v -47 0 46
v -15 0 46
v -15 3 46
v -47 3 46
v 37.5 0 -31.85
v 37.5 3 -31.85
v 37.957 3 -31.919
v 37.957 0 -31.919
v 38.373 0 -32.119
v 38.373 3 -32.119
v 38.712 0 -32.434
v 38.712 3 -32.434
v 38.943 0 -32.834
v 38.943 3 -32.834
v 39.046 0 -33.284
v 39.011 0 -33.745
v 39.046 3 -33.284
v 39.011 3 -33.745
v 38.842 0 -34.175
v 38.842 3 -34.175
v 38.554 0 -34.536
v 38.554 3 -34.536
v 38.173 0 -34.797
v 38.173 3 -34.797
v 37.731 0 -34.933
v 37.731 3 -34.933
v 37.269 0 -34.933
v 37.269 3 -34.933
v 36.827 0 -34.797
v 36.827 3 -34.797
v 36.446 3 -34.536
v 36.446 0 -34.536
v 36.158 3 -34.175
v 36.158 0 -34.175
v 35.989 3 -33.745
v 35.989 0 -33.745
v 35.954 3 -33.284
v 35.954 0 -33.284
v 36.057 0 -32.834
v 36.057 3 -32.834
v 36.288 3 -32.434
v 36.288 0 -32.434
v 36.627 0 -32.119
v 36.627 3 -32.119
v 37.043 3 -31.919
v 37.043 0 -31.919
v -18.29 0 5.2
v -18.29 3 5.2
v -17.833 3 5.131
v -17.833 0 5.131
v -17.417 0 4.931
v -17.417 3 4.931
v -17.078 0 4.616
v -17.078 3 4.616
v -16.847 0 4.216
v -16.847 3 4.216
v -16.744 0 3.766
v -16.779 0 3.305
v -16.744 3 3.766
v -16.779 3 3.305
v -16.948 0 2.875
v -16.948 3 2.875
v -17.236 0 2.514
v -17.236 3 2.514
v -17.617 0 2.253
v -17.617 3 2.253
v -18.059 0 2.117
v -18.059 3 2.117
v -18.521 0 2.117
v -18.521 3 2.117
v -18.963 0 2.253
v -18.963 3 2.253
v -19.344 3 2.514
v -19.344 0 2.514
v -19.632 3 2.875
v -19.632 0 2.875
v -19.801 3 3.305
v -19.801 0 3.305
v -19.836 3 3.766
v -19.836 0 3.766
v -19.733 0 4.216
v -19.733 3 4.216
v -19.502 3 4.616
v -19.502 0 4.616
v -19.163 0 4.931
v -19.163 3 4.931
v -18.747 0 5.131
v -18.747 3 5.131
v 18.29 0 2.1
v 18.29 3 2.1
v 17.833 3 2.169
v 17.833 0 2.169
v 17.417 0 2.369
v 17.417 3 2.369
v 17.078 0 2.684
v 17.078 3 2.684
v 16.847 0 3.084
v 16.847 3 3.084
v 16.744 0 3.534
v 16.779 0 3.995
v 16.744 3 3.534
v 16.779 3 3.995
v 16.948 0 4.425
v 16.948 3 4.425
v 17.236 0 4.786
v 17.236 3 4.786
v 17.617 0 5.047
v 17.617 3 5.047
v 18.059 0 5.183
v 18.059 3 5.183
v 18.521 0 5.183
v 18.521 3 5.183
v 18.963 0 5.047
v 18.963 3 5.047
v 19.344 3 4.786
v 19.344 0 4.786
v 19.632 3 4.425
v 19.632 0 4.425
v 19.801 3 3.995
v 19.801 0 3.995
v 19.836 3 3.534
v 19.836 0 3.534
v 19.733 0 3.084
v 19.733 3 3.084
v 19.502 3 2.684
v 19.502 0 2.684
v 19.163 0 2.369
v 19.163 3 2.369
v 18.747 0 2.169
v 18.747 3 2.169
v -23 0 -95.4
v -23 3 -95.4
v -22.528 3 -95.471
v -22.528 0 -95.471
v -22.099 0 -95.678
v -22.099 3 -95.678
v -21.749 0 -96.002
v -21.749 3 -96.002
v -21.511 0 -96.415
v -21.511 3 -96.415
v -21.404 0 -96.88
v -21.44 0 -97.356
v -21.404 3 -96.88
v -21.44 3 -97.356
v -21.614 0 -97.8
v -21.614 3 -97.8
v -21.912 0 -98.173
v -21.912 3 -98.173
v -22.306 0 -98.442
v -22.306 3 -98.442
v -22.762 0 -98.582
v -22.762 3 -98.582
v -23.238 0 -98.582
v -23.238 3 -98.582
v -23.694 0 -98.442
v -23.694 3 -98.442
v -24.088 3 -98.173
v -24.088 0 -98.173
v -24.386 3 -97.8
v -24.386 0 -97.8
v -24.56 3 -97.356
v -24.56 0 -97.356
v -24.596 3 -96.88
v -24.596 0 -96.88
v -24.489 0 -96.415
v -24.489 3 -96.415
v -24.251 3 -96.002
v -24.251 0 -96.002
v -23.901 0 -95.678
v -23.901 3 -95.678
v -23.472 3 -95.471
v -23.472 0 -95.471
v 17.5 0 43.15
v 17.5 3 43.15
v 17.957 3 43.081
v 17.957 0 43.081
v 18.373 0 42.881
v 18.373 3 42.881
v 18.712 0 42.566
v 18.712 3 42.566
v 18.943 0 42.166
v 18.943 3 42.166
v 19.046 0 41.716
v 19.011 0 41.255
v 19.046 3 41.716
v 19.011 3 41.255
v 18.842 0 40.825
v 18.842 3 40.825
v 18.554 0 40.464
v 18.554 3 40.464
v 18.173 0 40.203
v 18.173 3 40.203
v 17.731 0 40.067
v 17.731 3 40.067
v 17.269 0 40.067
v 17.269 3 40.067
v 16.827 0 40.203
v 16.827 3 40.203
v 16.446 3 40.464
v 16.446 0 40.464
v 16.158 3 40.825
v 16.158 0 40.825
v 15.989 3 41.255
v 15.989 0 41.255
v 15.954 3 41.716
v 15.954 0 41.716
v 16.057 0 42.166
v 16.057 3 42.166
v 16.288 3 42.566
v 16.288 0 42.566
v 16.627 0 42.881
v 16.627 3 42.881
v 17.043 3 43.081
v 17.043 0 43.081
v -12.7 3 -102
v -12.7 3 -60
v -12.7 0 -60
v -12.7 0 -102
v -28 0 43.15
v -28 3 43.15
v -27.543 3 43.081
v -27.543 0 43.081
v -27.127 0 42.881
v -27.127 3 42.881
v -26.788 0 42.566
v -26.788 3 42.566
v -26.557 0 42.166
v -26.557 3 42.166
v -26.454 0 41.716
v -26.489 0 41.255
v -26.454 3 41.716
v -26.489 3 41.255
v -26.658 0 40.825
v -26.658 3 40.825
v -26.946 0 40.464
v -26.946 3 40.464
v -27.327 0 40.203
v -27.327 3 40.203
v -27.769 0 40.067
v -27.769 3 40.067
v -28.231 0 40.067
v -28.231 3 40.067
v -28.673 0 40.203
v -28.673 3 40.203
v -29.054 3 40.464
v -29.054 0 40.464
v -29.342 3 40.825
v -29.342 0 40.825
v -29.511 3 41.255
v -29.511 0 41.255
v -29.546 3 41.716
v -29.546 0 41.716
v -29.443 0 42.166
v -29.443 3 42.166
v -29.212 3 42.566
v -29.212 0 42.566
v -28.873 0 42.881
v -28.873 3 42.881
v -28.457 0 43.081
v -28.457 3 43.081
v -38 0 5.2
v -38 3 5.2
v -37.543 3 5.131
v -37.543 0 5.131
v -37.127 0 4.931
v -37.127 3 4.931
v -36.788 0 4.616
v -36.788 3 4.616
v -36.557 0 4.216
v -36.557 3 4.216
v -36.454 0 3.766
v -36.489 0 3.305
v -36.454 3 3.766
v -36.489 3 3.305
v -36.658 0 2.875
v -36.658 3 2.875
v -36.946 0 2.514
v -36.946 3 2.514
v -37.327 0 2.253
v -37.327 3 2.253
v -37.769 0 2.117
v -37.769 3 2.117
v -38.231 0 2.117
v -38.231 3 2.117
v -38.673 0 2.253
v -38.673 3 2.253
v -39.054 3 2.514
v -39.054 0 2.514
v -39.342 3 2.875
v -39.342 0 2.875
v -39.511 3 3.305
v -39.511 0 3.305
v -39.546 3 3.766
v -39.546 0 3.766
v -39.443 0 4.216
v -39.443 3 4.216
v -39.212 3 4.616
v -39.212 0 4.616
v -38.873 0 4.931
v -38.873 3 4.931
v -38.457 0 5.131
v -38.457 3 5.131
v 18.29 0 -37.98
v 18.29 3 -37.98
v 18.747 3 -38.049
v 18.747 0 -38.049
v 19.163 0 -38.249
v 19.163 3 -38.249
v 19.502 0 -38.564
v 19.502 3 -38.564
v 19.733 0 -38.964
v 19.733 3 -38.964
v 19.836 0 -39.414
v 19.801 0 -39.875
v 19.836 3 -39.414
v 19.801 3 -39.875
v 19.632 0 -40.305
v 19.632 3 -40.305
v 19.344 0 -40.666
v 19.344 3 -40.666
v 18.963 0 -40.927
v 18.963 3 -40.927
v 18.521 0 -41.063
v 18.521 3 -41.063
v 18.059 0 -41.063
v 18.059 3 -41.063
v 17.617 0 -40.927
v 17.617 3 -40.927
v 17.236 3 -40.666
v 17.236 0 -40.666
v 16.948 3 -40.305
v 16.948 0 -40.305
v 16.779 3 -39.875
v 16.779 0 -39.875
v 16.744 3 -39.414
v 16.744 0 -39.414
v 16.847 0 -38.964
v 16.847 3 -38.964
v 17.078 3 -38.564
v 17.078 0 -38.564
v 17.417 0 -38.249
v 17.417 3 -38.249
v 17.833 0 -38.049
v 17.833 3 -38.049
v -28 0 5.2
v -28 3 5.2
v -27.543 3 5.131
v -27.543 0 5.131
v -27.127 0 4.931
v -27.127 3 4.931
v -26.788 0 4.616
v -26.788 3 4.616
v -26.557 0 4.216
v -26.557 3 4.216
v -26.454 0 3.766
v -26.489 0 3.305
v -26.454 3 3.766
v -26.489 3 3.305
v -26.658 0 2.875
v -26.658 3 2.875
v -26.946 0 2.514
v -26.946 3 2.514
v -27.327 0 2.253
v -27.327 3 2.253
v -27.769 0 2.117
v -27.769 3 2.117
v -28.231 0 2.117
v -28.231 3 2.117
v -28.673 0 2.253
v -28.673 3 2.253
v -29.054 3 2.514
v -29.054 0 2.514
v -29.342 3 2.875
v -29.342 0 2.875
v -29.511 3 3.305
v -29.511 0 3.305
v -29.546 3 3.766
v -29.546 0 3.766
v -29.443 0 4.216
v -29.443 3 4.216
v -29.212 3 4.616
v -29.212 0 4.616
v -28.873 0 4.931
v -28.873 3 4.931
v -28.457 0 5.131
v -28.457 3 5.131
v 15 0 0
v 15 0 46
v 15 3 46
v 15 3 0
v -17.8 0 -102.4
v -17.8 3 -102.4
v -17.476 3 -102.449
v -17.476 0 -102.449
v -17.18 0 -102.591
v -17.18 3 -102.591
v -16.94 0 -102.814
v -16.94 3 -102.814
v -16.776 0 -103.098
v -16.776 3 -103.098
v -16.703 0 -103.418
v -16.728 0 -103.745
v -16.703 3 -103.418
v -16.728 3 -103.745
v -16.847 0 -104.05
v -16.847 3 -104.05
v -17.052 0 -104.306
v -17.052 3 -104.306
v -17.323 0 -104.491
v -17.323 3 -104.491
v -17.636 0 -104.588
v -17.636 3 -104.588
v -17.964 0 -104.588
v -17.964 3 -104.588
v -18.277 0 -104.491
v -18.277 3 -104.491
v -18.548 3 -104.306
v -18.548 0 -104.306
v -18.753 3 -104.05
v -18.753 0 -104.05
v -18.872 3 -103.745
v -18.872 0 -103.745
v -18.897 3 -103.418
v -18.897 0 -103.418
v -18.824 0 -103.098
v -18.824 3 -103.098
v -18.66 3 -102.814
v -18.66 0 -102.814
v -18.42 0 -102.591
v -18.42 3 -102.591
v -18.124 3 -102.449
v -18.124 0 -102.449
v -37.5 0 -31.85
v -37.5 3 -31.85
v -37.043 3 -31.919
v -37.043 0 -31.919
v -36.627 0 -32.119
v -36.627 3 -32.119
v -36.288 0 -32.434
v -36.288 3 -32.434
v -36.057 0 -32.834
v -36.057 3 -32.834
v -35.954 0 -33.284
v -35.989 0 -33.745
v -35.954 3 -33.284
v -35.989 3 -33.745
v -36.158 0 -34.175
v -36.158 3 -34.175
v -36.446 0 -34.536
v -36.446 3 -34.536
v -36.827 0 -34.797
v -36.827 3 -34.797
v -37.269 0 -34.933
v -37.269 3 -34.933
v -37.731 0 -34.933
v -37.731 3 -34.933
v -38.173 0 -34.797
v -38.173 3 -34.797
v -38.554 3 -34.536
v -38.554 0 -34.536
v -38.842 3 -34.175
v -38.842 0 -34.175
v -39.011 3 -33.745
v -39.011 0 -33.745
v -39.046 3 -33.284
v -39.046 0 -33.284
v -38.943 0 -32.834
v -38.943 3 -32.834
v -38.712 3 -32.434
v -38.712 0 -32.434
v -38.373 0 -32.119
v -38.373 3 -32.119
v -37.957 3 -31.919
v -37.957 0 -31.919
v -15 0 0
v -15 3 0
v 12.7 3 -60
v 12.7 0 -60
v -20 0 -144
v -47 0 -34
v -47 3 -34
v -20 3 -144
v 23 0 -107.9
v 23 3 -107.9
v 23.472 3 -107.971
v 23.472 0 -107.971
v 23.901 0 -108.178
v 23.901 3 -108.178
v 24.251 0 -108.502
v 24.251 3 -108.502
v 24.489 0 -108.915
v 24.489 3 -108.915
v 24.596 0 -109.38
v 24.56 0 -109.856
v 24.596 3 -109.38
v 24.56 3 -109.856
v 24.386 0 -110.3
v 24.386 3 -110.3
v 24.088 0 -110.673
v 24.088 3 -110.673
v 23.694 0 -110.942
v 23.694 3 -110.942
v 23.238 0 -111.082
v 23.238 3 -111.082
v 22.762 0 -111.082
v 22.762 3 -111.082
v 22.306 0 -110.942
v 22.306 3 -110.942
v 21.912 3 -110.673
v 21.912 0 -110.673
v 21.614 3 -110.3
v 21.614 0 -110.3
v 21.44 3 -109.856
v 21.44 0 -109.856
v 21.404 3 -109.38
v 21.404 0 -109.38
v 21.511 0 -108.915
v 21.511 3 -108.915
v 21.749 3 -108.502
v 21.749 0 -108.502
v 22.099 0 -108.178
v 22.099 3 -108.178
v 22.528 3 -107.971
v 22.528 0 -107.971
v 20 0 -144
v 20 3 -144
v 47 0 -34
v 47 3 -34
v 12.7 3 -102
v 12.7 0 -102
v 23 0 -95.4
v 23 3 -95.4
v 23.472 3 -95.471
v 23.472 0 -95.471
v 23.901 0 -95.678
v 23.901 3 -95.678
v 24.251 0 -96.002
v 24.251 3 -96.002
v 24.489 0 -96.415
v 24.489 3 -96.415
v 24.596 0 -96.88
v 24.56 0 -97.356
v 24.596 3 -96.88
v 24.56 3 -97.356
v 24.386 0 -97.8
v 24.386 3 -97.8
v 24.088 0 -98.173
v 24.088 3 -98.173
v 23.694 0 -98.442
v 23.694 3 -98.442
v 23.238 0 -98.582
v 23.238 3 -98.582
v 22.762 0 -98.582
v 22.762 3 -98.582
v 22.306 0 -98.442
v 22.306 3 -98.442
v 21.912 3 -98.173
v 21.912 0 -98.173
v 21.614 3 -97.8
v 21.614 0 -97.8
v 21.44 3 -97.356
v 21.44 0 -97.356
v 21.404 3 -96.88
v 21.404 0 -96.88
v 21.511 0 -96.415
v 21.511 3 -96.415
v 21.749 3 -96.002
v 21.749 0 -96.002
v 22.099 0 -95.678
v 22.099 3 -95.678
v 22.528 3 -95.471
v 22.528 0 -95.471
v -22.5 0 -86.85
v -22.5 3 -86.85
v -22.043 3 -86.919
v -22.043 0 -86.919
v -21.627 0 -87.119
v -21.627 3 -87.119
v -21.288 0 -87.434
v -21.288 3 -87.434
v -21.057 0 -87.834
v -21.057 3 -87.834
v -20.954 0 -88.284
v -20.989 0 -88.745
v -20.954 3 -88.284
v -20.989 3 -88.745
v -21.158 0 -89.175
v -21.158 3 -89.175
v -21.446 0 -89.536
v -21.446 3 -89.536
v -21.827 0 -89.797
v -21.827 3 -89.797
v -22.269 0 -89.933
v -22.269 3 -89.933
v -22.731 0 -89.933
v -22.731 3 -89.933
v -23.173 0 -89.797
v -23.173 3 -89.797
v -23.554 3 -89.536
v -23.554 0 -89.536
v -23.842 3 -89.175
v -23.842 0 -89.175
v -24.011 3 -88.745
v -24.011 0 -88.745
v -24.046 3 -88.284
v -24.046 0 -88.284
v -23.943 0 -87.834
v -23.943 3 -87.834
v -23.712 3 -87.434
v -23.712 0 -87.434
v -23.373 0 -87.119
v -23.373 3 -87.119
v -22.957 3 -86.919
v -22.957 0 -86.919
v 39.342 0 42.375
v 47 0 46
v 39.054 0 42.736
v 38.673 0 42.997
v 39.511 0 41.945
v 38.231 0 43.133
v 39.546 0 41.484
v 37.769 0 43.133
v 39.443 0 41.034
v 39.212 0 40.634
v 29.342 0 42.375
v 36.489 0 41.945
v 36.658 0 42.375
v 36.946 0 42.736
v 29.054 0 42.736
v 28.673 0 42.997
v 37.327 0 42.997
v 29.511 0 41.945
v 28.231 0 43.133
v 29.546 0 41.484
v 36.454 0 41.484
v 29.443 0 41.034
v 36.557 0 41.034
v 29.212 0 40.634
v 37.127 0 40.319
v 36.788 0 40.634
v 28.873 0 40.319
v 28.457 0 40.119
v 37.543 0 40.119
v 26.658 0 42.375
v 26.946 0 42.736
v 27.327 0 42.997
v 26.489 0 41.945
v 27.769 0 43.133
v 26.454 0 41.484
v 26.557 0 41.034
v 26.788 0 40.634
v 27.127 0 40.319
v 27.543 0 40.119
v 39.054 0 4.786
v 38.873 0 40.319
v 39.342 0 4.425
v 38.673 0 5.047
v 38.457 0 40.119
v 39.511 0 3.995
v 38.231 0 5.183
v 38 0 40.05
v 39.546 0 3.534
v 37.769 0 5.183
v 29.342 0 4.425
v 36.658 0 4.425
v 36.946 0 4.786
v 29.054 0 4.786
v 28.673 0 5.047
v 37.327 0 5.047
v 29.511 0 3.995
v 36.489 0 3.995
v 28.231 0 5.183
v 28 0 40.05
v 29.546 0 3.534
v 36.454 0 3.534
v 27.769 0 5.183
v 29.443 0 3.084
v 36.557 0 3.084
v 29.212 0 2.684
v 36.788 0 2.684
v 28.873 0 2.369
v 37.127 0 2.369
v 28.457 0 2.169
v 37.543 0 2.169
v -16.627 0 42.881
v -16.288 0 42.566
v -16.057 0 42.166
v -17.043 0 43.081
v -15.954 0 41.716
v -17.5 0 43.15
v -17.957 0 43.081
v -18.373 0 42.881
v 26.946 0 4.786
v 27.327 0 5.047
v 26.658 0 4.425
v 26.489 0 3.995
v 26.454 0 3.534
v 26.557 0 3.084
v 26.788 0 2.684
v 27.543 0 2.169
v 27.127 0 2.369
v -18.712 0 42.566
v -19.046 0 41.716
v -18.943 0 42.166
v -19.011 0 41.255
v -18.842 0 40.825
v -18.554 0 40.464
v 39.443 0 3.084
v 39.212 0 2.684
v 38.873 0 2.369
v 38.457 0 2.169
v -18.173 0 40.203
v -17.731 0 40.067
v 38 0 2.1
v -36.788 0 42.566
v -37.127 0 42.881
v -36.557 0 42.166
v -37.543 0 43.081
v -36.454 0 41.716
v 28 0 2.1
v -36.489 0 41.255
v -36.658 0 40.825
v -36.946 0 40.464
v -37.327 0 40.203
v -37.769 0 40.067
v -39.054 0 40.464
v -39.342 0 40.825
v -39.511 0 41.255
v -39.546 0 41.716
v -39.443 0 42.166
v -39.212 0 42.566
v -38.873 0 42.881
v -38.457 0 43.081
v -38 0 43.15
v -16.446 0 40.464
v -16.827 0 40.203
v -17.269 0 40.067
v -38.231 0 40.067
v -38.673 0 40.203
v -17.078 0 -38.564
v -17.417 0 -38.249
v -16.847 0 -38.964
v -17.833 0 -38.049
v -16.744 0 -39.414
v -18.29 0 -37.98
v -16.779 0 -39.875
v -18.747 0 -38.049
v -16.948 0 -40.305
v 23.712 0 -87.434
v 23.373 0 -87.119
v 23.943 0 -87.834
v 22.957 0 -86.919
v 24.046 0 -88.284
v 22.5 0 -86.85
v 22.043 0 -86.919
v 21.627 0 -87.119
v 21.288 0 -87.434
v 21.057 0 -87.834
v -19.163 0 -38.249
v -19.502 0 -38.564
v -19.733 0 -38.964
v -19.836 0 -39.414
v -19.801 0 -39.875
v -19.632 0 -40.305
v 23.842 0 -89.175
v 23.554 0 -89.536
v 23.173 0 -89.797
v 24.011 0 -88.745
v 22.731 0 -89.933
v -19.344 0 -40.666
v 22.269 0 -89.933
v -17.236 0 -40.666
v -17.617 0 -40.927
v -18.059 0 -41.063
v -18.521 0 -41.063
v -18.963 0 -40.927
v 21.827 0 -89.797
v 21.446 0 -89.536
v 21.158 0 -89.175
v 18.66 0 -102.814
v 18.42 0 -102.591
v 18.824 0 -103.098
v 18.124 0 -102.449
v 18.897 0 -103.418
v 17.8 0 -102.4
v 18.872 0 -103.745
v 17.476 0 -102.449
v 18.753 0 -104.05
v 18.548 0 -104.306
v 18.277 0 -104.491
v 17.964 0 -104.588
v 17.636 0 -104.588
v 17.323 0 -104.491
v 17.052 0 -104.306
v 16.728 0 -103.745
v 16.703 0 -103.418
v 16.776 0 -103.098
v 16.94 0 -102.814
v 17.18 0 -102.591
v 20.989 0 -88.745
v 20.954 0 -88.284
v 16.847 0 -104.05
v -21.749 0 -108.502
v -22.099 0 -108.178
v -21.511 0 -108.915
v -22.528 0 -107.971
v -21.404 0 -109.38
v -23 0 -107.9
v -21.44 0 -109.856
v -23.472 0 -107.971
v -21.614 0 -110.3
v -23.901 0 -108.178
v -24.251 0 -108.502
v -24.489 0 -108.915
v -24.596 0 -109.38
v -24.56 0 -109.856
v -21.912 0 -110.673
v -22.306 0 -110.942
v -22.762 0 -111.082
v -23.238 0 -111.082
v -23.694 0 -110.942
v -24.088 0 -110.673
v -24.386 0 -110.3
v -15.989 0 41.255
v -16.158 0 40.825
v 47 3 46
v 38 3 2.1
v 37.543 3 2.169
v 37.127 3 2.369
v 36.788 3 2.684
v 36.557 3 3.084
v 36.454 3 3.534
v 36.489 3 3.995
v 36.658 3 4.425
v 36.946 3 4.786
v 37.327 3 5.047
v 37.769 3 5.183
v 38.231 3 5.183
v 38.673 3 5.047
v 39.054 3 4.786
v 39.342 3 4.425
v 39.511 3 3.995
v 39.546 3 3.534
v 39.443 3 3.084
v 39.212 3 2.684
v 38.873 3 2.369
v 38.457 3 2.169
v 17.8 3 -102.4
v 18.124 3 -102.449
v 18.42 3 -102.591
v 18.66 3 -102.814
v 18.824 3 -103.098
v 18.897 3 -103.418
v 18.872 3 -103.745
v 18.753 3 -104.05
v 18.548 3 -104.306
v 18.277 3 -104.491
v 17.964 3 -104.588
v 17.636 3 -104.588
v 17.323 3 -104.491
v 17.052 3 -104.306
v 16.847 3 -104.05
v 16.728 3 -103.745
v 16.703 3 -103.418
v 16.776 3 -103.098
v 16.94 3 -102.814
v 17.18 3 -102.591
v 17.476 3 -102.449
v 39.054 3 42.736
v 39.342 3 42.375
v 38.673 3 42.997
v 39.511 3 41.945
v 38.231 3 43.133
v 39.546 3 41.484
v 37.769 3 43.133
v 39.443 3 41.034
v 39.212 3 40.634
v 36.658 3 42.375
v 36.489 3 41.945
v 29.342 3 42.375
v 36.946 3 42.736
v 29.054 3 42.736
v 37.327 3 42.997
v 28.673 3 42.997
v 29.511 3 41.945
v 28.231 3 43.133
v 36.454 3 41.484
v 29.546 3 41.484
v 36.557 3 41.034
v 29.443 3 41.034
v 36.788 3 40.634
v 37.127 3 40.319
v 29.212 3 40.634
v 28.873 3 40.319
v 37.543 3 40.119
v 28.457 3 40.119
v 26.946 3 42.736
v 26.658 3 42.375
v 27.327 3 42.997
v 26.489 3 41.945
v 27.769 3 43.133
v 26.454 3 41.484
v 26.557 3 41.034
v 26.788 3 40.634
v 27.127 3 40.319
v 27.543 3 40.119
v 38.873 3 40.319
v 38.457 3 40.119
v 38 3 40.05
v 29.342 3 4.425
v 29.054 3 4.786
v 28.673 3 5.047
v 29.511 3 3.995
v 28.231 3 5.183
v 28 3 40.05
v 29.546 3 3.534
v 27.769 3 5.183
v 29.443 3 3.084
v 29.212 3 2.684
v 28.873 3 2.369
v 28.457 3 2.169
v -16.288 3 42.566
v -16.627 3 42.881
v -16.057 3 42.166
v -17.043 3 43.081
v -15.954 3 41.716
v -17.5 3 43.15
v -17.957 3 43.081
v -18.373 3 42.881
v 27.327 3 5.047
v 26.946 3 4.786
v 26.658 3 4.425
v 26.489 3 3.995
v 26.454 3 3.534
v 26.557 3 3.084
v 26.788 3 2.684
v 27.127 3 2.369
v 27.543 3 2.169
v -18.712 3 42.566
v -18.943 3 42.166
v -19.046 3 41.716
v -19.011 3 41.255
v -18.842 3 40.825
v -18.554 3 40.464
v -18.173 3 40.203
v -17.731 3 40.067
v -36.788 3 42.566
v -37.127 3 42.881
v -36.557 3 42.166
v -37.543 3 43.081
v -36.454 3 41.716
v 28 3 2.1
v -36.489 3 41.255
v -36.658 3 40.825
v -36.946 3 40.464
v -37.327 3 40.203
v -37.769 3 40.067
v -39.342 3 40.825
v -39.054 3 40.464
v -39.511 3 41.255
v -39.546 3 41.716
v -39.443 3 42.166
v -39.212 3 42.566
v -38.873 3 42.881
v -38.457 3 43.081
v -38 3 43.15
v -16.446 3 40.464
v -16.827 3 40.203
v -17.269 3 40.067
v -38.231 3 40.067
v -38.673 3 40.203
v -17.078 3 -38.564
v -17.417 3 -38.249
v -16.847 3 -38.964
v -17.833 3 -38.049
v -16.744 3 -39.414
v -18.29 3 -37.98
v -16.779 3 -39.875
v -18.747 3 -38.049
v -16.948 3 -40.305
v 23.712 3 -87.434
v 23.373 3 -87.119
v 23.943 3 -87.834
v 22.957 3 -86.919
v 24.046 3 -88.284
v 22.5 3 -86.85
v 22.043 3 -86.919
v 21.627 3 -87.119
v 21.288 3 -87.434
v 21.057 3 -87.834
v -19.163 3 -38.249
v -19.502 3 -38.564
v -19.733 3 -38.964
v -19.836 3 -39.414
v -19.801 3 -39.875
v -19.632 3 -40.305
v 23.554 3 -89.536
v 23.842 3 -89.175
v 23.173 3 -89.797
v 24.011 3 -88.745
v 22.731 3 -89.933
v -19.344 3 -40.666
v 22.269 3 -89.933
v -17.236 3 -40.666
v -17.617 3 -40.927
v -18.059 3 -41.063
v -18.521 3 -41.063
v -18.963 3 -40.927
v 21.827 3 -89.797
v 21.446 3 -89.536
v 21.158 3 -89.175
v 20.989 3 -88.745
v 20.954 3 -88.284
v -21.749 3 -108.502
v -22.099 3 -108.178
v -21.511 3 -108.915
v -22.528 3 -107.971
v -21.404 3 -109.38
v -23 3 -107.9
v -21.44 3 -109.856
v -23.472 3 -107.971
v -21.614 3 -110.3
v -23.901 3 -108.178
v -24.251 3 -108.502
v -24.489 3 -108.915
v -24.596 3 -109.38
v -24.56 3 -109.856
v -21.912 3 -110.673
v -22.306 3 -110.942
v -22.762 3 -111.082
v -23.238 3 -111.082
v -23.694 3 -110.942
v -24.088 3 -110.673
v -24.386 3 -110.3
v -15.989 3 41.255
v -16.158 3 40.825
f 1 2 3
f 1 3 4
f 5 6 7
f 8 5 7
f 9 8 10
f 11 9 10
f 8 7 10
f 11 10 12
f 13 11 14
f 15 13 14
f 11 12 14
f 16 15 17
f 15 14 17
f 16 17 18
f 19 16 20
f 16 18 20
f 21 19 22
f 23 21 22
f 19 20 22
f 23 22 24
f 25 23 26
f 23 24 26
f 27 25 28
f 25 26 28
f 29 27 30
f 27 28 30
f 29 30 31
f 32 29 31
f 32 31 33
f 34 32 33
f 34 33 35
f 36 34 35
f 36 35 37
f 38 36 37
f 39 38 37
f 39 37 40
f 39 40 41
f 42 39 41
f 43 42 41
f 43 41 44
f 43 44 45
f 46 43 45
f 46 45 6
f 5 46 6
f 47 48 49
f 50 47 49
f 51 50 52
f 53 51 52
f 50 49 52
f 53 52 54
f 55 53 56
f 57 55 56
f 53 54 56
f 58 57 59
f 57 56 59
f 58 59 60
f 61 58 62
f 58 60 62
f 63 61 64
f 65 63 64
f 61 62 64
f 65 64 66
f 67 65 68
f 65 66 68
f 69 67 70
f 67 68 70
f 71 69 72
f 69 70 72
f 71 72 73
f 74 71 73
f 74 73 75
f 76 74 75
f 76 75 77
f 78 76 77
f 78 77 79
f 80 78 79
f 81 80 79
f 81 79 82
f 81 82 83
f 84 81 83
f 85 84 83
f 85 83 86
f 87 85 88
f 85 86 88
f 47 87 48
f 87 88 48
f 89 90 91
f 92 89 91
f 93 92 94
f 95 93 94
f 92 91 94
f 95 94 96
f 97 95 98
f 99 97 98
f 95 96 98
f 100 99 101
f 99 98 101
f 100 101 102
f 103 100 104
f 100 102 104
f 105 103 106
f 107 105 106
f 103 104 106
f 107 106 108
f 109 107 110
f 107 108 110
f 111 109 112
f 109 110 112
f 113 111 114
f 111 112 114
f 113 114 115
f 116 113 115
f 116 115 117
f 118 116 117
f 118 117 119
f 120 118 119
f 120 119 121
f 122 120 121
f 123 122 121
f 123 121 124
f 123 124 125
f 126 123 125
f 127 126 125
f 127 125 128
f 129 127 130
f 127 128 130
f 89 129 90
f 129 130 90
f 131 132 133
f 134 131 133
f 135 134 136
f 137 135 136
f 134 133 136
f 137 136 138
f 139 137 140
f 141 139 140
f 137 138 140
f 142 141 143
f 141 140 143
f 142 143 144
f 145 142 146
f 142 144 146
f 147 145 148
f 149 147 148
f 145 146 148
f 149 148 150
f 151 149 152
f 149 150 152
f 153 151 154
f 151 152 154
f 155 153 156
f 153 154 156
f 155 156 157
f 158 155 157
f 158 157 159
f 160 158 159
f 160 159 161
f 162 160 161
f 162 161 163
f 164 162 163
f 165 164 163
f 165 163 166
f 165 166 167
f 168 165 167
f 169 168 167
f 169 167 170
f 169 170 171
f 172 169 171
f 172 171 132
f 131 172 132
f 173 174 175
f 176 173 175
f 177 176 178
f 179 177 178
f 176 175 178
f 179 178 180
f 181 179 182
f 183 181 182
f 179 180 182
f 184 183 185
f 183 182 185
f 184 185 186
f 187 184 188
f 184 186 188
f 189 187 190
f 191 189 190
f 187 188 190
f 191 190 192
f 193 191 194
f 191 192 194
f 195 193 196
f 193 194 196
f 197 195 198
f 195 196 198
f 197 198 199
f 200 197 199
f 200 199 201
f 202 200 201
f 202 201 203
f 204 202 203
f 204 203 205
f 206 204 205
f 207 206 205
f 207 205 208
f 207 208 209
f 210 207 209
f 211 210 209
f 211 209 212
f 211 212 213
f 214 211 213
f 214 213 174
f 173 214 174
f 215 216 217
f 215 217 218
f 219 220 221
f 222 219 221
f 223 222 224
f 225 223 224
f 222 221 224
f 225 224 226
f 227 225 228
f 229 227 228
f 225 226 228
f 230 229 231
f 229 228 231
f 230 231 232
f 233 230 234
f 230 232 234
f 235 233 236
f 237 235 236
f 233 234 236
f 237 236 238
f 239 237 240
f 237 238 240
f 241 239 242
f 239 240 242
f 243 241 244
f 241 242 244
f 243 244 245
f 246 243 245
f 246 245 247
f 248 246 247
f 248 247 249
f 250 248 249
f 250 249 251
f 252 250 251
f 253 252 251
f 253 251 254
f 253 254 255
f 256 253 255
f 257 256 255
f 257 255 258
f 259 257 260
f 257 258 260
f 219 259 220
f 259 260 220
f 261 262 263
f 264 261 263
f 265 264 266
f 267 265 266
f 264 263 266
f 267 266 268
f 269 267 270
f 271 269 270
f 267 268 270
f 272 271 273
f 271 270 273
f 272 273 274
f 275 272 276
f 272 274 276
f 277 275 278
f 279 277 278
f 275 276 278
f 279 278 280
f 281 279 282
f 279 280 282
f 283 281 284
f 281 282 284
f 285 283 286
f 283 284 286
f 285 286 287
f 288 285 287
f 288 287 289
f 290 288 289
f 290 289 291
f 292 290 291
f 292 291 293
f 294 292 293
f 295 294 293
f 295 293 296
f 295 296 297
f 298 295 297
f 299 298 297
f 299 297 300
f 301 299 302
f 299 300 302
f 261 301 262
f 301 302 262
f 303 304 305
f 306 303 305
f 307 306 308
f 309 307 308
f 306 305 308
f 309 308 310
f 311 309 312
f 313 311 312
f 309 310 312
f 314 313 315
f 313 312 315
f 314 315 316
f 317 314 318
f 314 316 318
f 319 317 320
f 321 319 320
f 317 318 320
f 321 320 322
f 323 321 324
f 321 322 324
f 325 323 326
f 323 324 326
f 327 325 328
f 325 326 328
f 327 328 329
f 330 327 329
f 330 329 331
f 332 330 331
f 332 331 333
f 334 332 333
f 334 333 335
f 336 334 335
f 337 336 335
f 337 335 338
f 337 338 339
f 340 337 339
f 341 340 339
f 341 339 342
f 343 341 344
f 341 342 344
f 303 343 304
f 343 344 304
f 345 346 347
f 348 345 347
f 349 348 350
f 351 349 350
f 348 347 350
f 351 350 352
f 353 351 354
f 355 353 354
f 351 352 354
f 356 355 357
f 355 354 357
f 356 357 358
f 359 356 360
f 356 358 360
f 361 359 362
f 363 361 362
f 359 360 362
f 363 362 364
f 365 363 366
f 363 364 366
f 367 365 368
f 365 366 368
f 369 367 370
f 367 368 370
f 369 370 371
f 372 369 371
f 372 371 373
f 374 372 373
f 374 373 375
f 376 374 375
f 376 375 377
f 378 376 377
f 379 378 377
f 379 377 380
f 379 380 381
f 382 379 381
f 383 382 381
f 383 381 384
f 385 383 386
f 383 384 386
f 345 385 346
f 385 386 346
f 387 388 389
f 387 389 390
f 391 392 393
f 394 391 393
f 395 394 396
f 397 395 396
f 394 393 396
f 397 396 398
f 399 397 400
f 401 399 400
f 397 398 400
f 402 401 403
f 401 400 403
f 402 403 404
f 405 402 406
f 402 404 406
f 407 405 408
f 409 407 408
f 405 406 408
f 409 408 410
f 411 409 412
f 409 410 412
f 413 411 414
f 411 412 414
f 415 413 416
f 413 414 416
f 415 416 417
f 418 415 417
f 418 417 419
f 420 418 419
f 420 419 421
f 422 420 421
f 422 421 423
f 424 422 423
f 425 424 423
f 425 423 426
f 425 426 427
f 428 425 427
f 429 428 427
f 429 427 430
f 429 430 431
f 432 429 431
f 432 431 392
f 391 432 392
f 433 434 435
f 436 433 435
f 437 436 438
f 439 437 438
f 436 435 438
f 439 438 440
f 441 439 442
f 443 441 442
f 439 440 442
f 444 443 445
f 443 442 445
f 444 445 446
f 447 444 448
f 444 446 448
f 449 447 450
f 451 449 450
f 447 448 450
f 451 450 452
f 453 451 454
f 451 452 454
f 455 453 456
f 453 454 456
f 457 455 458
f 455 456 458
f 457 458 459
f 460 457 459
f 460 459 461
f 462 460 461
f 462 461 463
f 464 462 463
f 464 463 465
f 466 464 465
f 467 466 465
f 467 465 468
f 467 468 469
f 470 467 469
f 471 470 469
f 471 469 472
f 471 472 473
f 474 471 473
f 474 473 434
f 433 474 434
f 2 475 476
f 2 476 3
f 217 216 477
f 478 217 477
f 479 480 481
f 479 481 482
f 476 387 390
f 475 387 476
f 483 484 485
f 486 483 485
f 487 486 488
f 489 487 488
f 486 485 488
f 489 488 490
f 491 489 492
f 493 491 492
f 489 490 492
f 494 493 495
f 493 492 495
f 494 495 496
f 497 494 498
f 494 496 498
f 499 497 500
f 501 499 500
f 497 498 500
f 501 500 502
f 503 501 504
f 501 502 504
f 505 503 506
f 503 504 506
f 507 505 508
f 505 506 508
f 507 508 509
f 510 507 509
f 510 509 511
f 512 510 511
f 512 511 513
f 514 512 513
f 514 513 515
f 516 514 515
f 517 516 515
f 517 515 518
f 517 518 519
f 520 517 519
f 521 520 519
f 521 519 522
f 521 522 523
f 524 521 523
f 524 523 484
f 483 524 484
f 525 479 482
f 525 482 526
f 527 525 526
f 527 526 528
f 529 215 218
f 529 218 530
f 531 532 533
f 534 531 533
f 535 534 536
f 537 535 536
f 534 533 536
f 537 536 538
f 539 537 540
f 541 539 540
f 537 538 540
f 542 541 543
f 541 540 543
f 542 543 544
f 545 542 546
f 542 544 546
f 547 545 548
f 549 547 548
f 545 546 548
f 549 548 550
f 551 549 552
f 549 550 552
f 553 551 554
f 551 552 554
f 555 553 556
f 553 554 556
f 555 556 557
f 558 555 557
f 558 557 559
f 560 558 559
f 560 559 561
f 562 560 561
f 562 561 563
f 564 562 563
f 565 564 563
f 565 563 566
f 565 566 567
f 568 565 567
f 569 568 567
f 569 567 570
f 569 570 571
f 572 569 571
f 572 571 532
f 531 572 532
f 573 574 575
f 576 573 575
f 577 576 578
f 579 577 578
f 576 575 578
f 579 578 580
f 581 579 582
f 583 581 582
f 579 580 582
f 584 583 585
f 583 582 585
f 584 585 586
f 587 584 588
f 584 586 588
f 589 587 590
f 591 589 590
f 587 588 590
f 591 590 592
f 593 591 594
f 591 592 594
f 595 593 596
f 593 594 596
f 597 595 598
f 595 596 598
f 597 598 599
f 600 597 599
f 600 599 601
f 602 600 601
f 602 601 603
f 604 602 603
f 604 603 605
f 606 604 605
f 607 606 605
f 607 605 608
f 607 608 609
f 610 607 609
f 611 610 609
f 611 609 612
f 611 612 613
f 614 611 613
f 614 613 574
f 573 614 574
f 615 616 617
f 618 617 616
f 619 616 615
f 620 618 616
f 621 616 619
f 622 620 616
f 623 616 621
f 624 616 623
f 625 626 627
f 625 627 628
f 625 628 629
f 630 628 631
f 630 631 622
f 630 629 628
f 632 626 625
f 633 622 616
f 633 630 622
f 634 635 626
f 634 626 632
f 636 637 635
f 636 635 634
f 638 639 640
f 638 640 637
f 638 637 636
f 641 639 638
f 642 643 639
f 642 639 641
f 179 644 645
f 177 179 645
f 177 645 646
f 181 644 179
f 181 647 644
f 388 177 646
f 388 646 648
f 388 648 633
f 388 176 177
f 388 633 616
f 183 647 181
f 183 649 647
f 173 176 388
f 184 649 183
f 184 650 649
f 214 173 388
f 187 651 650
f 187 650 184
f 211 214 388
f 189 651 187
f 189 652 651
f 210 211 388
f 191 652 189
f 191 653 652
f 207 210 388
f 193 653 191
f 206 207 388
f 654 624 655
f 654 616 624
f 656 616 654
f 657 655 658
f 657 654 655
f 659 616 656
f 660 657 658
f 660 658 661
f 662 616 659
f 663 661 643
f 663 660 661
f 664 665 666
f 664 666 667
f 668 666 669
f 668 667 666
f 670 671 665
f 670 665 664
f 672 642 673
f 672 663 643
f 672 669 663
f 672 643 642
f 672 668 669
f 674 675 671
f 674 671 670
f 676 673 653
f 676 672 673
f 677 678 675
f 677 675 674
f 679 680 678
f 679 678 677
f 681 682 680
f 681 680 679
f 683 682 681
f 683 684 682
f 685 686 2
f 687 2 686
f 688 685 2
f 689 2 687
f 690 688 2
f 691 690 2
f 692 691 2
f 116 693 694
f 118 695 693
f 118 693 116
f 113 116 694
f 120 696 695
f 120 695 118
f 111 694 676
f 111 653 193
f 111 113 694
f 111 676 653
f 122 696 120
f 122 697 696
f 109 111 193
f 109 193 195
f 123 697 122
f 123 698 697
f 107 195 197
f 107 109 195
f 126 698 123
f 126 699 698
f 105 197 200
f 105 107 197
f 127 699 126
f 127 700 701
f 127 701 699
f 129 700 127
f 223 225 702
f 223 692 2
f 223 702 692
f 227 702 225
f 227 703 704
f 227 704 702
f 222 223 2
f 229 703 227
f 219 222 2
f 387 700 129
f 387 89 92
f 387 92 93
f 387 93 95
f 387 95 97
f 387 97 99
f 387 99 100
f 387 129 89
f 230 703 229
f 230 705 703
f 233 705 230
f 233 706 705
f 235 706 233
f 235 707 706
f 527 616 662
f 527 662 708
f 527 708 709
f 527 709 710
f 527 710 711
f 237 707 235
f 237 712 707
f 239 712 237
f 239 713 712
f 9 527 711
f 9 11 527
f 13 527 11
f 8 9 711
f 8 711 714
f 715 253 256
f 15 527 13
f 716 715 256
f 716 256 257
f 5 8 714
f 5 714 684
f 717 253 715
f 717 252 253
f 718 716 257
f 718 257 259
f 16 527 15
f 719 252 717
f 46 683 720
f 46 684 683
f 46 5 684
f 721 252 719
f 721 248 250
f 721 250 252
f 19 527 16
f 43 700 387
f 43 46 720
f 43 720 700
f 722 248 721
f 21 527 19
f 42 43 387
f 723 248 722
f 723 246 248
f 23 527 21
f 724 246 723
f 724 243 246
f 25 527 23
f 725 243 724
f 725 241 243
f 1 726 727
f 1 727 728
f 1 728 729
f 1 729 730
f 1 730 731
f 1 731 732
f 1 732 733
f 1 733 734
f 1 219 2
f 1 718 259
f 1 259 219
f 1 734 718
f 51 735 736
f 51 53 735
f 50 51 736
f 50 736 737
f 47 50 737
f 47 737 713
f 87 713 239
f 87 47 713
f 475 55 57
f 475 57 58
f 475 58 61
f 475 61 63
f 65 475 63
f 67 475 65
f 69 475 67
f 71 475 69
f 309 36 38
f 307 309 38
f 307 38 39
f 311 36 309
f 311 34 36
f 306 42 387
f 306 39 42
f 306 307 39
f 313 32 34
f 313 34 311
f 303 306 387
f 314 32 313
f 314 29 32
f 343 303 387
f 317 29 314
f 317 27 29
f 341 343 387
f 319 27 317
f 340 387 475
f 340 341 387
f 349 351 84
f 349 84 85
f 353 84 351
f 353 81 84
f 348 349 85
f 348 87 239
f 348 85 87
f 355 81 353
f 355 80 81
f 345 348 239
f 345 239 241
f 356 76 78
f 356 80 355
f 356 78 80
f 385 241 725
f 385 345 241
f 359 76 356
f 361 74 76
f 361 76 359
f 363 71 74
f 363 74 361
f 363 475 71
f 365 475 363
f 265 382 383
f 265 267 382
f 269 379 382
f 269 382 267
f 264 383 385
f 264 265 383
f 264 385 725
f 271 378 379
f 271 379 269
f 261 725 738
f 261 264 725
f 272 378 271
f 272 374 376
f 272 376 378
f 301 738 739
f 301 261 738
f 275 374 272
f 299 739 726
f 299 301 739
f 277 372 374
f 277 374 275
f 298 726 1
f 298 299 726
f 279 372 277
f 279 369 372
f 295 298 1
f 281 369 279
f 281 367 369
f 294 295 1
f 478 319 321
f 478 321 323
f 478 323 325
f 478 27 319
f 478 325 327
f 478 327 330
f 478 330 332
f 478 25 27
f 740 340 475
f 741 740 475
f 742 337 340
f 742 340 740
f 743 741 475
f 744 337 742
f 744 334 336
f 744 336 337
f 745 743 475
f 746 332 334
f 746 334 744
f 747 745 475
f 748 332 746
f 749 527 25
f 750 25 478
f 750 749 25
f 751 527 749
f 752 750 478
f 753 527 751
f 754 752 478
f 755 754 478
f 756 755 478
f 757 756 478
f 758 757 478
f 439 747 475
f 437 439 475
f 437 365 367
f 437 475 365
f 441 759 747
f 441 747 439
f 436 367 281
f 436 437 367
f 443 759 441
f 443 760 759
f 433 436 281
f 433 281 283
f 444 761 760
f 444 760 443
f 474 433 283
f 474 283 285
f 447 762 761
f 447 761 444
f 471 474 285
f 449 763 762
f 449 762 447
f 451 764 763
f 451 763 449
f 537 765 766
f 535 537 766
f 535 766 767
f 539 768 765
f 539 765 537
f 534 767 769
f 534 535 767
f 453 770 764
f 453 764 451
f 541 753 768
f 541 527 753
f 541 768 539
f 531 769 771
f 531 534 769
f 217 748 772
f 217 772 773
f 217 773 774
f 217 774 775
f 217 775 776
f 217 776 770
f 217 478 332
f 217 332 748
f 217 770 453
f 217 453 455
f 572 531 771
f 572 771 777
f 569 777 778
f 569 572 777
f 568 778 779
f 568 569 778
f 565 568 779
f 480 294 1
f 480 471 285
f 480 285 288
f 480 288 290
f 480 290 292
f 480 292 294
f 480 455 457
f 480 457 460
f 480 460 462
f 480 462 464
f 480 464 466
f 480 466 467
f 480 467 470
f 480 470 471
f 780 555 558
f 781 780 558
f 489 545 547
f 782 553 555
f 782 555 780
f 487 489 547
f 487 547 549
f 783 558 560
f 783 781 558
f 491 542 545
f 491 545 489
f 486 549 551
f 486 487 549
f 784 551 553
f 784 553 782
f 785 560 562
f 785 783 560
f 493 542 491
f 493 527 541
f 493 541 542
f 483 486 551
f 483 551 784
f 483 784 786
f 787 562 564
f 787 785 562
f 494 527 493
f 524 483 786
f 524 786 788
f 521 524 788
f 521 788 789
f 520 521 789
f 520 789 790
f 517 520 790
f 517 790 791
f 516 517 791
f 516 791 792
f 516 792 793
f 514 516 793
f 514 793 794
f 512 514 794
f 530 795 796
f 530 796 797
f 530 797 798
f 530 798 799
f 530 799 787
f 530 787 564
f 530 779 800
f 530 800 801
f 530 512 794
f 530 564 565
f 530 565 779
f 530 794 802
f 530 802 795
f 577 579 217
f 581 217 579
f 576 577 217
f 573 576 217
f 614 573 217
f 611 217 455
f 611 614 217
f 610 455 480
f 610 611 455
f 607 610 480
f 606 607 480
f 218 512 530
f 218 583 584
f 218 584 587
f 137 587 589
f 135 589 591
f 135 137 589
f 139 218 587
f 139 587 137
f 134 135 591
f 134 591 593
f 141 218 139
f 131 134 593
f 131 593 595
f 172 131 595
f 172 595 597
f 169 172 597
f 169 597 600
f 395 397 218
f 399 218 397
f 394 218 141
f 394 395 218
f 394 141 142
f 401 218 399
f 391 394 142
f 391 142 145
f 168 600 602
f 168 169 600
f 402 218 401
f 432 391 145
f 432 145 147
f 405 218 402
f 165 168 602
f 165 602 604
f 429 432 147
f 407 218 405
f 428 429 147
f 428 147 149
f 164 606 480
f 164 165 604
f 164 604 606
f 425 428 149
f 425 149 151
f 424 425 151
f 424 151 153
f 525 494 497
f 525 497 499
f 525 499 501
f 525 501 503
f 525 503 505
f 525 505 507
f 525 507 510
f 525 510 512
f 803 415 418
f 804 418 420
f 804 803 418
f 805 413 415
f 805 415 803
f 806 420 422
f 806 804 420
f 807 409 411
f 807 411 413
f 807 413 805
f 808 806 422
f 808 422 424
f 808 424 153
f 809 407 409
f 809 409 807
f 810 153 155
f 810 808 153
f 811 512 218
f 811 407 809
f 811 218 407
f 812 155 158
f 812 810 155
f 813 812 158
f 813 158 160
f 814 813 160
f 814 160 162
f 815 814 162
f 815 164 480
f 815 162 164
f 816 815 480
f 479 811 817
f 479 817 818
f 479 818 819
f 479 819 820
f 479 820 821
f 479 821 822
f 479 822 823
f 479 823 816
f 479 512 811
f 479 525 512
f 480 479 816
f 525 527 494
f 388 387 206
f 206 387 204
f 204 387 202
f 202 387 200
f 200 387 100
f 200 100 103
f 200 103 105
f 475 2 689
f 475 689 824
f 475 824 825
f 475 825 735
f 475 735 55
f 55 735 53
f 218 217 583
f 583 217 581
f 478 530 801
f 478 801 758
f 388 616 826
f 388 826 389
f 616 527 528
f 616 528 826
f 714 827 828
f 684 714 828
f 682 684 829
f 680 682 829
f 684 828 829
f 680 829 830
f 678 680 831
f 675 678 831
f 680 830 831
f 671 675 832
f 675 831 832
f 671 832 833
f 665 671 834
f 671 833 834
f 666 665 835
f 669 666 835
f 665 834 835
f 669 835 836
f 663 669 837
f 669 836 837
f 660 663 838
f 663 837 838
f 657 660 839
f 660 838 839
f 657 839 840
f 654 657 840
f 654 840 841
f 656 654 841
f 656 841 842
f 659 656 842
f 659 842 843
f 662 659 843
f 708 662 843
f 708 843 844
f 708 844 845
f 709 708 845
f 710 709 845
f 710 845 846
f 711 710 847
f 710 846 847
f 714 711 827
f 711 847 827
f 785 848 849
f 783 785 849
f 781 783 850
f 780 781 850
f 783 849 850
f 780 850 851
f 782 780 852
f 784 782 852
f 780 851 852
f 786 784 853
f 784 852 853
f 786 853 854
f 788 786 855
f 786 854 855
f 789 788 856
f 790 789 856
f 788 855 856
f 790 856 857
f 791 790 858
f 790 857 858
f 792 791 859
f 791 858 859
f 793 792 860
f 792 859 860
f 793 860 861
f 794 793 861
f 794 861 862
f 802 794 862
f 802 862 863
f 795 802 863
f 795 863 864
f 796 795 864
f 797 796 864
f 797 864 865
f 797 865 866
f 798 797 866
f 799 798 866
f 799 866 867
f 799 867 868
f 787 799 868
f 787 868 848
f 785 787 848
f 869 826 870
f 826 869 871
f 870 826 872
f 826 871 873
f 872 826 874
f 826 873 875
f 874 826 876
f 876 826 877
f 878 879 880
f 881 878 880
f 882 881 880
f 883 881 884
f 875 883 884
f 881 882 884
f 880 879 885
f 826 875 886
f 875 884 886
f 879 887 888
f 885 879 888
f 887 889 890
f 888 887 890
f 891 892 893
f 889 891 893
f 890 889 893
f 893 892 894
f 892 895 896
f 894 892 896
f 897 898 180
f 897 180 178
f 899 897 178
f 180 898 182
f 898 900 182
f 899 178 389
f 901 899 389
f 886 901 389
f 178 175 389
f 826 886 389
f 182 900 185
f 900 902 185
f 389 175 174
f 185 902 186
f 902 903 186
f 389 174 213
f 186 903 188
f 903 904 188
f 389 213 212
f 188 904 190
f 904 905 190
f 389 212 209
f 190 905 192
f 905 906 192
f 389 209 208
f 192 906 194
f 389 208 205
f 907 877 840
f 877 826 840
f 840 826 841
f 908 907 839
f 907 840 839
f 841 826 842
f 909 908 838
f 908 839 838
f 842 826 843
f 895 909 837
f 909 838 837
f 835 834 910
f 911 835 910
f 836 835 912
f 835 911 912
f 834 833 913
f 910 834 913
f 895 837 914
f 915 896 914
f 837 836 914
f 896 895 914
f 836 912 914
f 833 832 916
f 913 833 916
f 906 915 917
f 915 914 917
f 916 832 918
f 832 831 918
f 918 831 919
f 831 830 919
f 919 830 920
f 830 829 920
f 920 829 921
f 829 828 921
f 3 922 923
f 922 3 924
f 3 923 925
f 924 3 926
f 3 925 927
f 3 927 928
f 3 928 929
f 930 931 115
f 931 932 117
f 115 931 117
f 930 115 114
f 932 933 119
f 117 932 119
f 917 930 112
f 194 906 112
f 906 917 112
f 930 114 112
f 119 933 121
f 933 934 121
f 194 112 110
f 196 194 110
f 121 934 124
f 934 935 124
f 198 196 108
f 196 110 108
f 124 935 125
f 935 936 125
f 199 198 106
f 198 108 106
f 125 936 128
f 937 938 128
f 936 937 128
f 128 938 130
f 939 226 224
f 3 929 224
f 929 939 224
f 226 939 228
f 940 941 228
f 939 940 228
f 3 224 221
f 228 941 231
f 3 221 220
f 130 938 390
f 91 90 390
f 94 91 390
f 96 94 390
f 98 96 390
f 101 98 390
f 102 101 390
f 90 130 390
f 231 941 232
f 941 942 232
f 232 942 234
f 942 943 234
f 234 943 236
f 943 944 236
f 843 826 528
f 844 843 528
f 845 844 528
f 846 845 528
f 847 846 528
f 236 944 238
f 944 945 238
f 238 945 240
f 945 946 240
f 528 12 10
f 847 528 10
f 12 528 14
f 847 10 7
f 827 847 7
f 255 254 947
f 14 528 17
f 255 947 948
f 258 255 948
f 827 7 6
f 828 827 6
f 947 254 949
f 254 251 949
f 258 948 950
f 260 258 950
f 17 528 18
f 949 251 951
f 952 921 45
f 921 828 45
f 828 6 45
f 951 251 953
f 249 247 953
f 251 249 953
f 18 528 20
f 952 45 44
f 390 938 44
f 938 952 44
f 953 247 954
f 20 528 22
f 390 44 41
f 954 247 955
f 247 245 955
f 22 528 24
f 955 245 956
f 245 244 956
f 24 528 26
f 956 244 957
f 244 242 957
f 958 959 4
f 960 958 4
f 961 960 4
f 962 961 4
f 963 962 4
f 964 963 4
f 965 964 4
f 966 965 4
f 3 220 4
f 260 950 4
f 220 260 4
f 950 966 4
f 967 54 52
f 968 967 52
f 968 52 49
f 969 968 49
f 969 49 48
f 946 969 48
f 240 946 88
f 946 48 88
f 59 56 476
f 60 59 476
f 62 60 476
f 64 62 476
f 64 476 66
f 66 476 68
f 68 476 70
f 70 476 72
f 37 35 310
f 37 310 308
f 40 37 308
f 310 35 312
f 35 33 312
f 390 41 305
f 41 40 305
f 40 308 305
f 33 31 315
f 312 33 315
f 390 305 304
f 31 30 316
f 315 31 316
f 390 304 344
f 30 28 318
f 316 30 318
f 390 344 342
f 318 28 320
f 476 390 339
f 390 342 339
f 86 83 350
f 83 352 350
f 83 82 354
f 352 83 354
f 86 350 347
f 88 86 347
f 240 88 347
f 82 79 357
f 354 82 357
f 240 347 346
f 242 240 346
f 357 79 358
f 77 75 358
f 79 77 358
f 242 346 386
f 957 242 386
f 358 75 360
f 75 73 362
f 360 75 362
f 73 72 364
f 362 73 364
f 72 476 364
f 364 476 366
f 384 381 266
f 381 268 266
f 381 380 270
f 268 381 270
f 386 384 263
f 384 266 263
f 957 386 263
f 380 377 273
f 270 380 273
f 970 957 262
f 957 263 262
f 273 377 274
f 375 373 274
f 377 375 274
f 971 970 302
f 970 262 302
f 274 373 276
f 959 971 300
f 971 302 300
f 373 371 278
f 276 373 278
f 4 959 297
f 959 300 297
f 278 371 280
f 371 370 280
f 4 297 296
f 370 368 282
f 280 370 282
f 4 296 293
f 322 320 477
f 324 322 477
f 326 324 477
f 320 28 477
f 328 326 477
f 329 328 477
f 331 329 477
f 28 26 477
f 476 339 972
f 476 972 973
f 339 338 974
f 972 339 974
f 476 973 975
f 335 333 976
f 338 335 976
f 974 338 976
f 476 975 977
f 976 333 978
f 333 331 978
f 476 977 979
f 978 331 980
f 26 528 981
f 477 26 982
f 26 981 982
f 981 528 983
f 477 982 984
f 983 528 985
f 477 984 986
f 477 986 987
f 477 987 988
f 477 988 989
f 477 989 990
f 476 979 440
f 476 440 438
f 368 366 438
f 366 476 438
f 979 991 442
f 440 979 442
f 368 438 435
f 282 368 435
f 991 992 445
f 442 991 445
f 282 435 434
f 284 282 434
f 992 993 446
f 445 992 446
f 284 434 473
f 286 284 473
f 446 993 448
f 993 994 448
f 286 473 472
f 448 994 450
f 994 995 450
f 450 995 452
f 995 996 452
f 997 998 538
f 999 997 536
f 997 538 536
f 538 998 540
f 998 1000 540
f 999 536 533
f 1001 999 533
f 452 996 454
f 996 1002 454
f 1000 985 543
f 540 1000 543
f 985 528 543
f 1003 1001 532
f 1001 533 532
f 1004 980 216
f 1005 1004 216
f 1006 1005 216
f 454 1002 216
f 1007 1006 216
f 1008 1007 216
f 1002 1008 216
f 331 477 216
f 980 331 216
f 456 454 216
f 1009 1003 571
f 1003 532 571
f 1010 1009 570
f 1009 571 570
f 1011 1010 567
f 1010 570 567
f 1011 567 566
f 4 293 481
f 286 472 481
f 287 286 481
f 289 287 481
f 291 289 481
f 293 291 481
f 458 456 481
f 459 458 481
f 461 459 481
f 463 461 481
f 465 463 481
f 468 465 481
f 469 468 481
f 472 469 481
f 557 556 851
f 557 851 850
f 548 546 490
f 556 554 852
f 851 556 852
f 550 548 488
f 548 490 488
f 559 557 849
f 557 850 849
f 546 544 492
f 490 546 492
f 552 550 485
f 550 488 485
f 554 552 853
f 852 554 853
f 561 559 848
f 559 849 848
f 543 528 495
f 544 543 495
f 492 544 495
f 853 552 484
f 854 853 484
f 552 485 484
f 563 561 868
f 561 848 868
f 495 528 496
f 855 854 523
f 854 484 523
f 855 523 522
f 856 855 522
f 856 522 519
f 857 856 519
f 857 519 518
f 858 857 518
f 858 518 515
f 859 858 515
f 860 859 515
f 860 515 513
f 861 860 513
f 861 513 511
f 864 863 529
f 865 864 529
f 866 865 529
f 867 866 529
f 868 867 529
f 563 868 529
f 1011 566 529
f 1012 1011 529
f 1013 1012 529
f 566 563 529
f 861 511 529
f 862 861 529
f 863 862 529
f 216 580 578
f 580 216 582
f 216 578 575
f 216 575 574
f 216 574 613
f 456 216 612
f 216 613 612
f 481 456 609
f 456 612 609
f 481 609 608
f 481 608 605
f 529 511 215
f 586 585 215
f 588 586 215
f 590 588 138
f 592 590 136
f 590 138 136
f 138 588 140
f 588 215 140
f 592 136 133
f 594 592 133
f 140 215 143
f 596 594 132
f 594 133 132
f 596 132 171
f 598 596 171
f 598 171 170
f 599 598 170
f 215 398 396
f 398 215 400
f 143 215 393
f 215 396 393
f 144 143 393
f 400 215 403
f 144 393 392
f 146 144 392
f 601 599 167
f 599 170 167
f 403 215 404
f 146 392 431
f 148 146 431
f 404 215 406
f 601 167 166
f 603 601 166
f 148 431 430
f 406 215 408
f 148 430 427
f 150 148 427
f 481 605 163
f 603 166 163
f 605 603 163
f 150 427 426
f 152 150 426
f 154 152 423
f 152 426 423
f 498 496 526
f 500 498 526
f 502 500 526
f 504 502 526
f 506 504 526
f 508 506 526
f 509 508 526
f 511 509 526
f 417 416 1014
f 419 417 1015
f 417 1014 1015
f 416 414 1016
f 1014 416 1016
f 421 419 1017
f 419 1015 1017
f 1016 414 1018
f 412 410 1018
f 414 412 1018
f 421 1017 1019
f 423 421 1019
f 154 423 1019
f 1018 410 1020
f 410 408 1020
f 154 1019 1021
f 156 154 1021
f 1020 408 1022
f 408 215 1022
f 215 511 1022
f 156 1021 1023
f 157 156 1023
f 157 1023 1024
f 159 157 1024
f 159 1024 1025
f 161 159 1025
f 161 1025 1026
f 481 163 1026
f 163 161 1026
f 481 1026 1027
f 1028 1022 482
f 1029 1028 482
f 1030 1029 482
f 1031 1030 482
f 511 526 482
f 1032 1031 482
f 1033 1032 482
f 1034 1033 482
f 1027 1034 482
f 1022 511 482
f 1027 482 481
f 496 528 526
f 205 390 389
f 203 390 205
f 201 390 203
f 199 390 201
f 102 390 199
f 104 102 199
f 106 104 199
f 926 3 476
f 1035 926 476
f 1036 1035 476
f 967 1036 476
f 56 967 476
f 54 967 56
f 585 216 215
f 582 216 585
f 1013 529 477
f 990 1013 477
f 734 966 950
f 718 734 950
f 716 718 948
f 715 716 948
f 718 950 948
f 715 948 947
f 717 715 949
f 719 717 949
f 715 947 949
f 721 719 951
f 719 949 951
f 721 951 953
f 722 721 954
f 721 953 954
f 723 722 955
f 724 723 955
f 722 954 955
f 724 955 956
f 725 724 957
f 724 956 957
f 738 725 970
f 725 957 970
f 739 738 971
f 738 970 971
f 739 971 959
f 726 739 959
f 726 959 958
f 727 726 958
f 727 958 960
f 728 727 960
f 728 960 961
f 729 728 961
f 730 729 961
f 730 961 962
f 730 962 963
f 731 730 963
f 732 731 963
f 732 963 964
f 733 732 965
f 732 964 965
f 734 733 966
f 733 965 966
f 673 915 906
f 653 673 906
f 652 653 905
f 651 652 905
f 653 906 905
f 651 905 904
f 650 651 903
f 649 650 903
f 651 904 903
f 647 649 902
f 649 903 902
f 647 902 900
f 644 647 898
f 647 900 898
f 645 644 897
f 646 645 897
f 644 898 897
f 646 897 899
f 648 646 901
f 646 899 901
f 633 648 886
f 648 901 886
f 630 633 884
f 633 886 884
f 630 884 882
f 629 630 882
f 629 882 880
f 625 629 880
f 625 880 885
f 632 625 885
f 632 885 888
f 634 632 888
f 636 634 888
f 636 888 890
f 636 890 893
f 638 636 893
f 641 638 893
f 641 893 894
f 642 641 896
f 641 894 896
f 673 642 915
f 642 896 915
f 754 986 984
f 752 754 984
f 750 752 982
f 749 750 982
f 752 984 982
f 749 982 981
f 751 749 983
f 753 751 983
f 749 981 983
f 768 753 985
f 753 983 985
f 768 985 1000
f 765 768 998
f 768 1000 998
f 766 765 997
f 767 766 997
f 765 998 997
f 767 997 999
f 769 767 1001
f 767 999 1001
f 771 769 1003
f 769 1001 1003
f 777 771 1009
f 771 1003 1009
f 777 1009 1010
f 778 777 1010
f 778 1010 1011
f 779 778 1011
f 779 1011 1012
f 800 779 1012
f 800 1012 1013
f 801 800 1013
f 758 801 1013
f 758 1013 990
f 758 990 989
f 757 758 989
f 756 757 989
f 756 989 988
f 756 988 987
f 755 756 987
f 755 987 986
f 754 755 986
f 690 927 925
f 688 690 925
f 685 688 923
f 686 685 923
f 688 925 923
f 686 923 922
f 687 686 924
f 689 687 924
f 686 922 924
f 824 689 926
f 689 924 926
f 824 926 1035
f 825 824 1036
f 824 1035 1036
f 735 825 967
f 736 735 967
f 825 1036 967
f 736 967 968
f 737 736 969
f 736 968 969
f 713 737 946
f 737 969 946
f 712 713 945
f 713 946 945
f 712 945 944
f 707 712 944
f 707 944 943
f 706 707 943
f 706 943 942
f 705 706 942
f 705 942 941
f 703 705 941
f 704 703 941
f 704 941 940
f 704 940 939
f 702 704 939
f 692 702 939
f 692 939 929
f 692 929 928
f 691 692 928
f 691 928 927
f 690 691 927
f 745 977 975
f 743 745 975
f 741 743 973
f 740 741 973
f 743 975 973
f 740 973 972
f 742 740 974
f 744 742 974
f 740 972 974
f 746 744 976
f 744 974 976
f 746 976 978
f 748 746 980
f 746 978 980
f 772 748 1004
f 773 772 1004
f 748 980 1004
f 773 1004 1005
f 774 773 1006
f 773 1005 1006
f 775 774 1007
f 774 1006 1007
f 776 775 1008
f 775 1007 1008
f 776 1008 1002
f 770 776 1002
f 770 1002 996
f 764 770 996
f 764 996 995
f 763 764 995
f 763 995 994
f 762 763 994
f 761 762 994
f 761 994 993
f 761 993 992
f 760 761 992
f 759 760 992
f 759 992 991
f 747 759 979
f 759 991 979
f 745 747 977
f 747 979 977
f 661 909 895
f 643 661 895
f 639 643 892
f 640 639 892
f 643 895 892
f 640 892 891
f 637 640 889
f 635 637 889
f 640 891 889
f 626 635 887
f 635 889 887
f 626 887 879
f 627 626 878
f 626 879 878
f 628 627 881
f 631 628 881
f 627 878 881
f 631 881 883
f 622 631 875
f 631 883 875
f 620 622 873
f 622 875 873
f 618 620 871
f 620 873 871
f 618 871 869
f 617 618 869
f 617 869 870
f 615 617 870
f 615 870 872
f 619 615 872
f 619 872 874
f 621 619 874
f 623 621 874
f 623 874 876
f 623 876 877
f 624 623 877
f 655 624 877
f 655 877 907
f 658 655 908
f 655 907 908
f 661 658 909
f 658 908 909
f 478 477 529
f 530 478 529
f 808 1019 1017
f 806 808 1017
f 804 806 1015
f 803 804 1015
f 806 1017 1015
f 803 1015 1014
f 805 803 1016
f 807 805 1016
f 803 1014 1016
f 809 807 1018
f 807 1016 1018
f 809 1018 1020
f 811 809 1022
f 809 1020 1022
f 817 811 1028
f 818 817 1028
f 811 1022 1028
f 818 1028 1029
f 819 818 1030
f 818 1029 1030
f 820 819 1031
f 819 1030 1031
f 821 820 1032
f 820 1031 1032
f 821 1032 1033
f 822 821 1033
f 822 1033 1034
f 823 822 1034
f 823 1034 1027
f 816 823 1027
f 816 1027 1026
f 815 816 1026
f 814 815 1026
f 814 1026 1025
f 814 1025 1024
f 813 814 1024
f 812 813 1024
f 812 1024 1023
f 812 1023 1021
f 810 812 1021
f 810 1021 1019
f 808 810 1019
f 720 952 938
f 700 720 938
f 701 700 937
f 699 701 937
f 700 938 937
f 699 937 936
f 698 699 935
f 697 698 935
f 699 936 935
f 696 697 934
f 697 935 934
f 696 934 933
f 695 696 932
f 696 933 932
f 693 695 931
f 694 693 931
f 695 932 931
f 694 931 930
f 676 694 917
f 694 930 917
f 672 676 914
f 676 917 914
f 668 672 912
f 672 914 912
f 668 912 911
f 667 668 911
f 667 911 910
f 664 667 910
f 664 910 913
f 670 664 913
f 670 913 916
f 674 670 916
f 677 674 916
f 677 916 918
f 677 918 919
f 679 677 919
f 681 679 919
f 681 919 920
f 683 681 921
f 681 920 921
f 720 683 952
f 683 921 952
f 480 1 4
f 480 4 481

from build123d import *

# Parameters (mm, degrees)
BODY_DEPTH             = 3
SKETCH4_R              = 1.55
MOTOR_MOUNT_DEPTH      = 3
SKETCH5_R              = 1.1
SKETCH5_W              = 25.4
SKETCH5_H              = 42
PROTOBOARD_MOUNT_DEPTH = 10
SKETCH6_R              = 1.6
CASTER_MOUNT_DEPTH     = 10
SKETCH8_R              = 1.55
STAND_OFF_MOUNT_DEPTH  = 10


with BuildPart() as part:
    # Sketch3 → Body (new body)
    with BuildSketch(Plane(origin=(0, 0, 0), x_dir=(1, 0, 0), z_dir=(0, 1, 0))):
        Polygon((-15, -46), (-47, -46), (-47, 34), (-20, 144), (20, 144), (47, 34), (47, -46), (15, -46), (15, 0), (-15, 0), align=None)
    extrude(amount=BODY_DEPTH)

    # Sketch4 → Motor Mount (cut)
    with BuildSketch(Plane(origin=(0, 3, 0), x_dir=(1, 0, 0), z_dir=(0, 1, 0))):
        with Locations(Location((-38, -3.65, 0), (0, 0, 270))):
            Circle(SKETCH4_R)
        with Locations(Location((-28, -3.65, 0), (0, 0, 270))):
            Circle(SKETCH4_R)
        with Locations(Location((-38, -41.6, 0), (0, 0, 270))):
            Circle(SKETCH4_R)
        with Locations(Location((-28, -41.6, 0), (0, 0, 270))):
            Circle(SKETCH4_R)
        with Locations(Location((-18.29, -3.65, 0), (0, 0, 270))):
            Circle(SKETCH4_R)
        with Locations(Location((18.29, -3.65, 0), (0, 0, 90))):
            Circle(SKETCH4_R)
        with Locations(Location((28, -41.6, 0), (0, 0, 90))):
            Circle(SKETCH4_R)
        with Locations(Location((38, -41.6, 0), (0, 0, 90))):
            Circle(SKETCH4_R)
        with Locations(Location((28, -3.65, 0), (0, 0, 90))):
            Circle(SKETCH4_R)
        with Locations(Location((38, -3.65, 0), (0, 0, 90))):
            Circle(SKETCH4_R)
        with Locations(Location((-18.29, 39.53, 0), (0, 0, 270))):
            Circle(SKETCH4_R)
        with Locations(Location((18.29, 39.53, 0), (0, 0, 270))):
            Circle(SKETCH4_R)
    extrude(amount=-MOTOR_MOUNT_DEPTH, mode=Mode.SUBTRACT)

    # Sketch5 → Protoboard Mount (cut)
    with BuildSketch(Plane(origin=(0, 3, 0), x_dir=(1, 0, 0), z_dir=(0, 1, 0))):
        with Locations(Location((-17.8, 103.5, 0), (0, 0, 270))):
            Circle(SKETCH5_R)
        with Locations(Location((17.8, 103.5, 0), (0, 0, 270))):
            Circle(SKETCH5_R)
        with Locations((0, 81)):
            Rectangle(SKETCH5_W, SKETCH5_H)
    extrude(amount=-PROTOBOARD_MOUNT_DEPTH, mode=Mode.SUBTRACT)

    # Sketch6 → Caster Mount (cut)
    with BuildSketch(Plane(origin=(0, 3, 0), x_dir=(1, 0, 0), z_dir=(0, 1, 0))):
        with Locations(Location((-23, 109.5, 0), (0, 0, 270))):
            Circle(SKETCH6_R)
        with Locations(Location((-23, 97, 0), (0, 0, 270))):
            Circle(SKETCH6_R)
        with Locations(Location((23, 97, 0), (0, 0, 270))):
            Circle(SKETCH6_R)
        with Locations(Location((23, 109.5, 0), (0, 0, 270))):
            Circle(SKETCH6_R)
    extrude(amount=-CASTER_MOUNT_DEPTH, mode=Mode.SUBTRACT)

    # Sketch8 → Stand Off Mount (cut)
    with BuildSketch(Plane(origin=(0, 3, 0), x_dir=(1, 0, 0), z_dir=(0, 1, 0))):
        with Locations(Location((-22.5, 88.4, 0), (0, 0, 270))):
            Circle(SKETCH8_R)
        with Locations(Location((22.5, 88.4, 0), (0, 0, 270))):
            Circle(SKETCH8_R)
        with Locations(Location((37.5, 33.4, 0), (0, 0, 270))):
            Circle(SKETCH8_R)
        with Locations(Location((-37.5, 33.4, 0), (0, 0, 270))):
            Circle(SKETCH8_R)
        with Locations(Location((-17.5, -41.6, 0), (0, 0, 270))):
            Circle(SKETCH8_R)
        with Locations(Location((17.5, -41.6, 0), (0, 0, 270))):
            Circle(SKETCH8_R)
    extrude(amount=-STAND_OFF_MOUNT_DEPTH, mode=Mode.SUBTRACT)


solid = part.part
